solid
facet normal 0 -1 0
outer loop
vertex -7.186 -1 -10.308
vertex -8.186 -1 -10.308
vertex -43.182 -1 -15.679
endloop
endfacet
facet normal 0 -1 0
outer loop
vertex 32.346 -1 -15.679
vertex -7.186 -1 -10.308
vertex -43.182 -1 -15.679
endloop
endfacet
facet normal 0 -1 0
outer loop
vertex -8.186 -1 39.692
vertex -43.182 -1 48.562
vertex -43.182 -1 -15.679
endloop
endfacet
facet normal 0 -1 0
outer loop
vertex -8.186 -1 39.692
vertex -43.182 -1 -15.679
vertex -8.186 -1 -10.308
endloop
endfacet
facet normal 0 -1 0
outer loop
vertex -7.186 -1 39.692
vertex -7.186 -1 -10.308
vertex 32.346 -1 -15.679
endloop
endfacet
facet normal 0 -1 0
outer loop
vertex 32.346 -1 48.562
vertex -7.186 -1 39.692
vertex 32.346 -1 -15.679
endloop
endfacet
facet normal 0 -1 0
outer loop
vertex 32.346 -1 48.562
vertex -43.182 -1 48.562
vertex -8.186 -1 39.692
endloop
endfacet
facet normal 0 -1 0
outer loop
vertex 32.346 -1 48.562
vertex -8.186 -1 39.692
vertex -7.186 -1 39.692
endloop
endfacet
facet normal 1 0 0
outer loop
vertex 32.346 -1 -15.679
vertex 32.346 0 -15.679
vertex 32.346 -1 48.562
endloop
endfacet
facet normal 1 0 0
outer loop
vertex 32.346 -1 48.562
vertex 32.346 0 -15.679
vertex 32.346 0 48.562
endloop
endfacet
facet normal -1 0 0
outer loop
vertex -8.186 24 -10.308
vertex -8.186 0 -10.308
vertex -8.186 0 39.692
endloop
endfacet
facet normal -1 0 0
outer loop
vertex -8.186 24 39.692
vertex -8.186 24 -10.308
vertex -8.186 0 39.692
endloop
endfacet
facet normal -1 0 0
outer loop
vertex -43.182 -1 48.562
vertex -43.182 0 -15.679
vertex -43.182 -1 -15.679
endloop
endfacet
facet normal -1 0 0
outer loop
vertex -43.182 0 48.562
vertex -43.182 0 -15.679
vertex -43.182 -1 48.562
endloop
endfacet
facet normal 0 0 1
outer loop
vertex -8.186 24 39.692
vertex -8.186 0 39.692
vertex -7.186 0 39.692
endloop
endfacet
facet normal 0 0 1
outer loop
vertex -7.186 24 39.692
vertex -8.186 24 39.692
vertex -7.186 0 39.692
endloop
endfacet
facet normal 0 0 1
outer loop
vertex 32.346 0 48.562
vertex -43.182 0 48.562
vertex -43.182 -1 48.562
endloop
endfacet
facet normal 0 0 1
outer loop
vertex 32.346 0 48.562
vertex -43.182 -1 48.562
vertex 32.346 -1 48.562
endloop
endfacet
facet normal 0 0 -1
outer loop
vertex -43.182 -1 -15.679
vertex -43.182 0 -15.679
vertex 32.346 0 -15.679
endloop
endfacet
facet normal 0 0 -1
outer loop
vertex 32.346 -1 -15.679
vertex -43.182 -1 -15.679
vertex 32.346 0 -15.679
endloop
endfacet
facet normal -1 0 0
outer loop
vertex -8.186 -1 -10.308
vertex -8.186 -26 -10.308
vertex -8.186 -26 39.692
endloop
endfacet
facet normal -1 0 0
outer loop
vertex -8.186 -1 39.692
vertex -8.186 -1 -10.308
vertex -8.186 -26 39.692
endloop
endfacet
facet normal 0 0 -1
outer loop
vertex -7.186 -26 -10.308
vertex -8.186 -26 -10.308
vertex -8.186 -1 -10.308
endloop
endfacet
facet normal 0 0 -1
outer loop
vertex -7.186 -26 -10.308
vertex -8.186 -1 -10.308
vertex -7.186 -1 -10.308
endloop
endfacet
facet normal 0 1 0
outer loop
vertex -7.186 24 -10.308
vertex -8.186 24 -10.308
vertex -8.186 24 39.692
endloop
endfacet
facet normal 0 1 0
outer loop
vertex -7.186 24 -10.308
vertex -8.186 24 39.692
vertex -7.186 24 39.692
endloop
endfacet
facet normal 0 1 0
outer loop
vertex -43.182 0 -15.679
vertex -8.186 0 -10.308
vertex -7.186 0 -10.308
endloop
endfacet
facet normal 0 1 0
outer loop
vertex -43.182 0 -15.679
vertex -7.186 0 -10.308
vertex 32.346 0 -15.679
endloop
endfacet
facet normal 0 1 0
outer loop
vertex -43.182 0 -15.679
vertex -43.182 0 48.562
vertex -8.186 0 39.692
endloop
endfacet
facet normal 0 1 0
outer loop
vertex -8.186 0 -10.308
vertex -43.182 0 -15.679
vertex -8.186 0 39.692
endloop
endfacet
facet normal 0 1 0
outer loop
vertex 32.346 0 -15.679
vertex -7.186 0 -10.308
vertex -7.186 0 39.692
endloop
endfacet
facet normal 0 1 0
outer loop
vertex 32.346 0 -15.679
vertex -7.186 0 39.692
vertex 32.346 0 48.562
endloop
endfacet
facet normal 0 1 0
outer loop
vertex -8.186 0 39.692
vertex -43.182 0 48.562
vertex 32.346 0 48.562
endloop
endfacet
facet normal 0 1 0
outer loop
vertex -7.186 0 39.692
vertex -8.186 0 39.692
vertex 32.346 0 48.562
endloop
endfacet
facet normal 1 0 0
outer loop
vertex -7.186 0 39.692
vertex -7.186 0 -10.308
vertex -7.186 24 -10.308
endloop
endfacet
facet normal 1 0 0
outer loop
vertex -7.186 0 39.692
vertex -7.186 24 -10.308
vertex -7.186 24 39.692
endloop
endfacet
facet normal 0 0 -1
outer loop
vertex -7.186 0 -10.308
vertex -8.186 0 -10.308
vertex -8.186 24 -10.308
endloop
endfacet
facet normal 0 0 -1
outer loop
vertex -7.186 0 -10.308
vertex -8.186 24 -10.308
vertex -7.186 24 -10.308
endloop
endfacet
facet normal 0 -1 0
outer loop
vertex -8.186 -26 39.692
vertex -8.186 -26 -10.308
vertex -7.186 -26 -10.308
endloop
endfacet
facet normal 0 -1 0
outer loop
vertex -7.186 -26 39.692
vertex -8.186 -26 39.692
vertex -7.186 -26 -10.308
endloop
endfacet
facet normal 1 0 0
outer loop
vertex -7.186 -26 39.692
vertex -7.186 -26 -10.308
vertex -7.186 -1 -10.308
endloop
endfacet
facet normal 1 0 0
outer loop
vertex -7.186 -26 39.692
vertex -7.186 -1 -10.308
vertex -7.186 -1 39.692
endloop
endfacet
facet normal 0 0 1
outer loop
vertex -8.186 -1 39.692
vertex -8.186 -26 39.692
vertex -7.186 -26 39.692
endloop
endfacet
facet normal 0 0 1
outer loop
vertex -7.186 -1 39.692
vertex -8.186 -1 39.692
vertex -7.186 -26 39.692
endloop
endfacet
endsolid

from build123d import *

# Parameters (mm, degrees)
F0_W     = 75.528022
F0_H     = 64.241523
F1_DEPTH = 1
F2_W     = 1
F2_H     = 50
F3_DEPTH = 25


with BuildPart() as f1:
    # F0 (on Front) → F1 (new body)
    with BuildSketch(Plane.XZ):
        with Locations((-5.417621, 16.441694)):
            Rectangle(F0_W, F0_H)
    extrude(amount=F1_DEPTH)

    # F2 (on face) → F3 (join, symmetric)
    with BuildSketch(Plane.XZ.offset(1)):
        with Locations((-7.686447, 14.69165)):
            Rectangle(F2_W, F2_H)
    extrude(amount=F3_DEPTH, both=True)


solid = f1.part
